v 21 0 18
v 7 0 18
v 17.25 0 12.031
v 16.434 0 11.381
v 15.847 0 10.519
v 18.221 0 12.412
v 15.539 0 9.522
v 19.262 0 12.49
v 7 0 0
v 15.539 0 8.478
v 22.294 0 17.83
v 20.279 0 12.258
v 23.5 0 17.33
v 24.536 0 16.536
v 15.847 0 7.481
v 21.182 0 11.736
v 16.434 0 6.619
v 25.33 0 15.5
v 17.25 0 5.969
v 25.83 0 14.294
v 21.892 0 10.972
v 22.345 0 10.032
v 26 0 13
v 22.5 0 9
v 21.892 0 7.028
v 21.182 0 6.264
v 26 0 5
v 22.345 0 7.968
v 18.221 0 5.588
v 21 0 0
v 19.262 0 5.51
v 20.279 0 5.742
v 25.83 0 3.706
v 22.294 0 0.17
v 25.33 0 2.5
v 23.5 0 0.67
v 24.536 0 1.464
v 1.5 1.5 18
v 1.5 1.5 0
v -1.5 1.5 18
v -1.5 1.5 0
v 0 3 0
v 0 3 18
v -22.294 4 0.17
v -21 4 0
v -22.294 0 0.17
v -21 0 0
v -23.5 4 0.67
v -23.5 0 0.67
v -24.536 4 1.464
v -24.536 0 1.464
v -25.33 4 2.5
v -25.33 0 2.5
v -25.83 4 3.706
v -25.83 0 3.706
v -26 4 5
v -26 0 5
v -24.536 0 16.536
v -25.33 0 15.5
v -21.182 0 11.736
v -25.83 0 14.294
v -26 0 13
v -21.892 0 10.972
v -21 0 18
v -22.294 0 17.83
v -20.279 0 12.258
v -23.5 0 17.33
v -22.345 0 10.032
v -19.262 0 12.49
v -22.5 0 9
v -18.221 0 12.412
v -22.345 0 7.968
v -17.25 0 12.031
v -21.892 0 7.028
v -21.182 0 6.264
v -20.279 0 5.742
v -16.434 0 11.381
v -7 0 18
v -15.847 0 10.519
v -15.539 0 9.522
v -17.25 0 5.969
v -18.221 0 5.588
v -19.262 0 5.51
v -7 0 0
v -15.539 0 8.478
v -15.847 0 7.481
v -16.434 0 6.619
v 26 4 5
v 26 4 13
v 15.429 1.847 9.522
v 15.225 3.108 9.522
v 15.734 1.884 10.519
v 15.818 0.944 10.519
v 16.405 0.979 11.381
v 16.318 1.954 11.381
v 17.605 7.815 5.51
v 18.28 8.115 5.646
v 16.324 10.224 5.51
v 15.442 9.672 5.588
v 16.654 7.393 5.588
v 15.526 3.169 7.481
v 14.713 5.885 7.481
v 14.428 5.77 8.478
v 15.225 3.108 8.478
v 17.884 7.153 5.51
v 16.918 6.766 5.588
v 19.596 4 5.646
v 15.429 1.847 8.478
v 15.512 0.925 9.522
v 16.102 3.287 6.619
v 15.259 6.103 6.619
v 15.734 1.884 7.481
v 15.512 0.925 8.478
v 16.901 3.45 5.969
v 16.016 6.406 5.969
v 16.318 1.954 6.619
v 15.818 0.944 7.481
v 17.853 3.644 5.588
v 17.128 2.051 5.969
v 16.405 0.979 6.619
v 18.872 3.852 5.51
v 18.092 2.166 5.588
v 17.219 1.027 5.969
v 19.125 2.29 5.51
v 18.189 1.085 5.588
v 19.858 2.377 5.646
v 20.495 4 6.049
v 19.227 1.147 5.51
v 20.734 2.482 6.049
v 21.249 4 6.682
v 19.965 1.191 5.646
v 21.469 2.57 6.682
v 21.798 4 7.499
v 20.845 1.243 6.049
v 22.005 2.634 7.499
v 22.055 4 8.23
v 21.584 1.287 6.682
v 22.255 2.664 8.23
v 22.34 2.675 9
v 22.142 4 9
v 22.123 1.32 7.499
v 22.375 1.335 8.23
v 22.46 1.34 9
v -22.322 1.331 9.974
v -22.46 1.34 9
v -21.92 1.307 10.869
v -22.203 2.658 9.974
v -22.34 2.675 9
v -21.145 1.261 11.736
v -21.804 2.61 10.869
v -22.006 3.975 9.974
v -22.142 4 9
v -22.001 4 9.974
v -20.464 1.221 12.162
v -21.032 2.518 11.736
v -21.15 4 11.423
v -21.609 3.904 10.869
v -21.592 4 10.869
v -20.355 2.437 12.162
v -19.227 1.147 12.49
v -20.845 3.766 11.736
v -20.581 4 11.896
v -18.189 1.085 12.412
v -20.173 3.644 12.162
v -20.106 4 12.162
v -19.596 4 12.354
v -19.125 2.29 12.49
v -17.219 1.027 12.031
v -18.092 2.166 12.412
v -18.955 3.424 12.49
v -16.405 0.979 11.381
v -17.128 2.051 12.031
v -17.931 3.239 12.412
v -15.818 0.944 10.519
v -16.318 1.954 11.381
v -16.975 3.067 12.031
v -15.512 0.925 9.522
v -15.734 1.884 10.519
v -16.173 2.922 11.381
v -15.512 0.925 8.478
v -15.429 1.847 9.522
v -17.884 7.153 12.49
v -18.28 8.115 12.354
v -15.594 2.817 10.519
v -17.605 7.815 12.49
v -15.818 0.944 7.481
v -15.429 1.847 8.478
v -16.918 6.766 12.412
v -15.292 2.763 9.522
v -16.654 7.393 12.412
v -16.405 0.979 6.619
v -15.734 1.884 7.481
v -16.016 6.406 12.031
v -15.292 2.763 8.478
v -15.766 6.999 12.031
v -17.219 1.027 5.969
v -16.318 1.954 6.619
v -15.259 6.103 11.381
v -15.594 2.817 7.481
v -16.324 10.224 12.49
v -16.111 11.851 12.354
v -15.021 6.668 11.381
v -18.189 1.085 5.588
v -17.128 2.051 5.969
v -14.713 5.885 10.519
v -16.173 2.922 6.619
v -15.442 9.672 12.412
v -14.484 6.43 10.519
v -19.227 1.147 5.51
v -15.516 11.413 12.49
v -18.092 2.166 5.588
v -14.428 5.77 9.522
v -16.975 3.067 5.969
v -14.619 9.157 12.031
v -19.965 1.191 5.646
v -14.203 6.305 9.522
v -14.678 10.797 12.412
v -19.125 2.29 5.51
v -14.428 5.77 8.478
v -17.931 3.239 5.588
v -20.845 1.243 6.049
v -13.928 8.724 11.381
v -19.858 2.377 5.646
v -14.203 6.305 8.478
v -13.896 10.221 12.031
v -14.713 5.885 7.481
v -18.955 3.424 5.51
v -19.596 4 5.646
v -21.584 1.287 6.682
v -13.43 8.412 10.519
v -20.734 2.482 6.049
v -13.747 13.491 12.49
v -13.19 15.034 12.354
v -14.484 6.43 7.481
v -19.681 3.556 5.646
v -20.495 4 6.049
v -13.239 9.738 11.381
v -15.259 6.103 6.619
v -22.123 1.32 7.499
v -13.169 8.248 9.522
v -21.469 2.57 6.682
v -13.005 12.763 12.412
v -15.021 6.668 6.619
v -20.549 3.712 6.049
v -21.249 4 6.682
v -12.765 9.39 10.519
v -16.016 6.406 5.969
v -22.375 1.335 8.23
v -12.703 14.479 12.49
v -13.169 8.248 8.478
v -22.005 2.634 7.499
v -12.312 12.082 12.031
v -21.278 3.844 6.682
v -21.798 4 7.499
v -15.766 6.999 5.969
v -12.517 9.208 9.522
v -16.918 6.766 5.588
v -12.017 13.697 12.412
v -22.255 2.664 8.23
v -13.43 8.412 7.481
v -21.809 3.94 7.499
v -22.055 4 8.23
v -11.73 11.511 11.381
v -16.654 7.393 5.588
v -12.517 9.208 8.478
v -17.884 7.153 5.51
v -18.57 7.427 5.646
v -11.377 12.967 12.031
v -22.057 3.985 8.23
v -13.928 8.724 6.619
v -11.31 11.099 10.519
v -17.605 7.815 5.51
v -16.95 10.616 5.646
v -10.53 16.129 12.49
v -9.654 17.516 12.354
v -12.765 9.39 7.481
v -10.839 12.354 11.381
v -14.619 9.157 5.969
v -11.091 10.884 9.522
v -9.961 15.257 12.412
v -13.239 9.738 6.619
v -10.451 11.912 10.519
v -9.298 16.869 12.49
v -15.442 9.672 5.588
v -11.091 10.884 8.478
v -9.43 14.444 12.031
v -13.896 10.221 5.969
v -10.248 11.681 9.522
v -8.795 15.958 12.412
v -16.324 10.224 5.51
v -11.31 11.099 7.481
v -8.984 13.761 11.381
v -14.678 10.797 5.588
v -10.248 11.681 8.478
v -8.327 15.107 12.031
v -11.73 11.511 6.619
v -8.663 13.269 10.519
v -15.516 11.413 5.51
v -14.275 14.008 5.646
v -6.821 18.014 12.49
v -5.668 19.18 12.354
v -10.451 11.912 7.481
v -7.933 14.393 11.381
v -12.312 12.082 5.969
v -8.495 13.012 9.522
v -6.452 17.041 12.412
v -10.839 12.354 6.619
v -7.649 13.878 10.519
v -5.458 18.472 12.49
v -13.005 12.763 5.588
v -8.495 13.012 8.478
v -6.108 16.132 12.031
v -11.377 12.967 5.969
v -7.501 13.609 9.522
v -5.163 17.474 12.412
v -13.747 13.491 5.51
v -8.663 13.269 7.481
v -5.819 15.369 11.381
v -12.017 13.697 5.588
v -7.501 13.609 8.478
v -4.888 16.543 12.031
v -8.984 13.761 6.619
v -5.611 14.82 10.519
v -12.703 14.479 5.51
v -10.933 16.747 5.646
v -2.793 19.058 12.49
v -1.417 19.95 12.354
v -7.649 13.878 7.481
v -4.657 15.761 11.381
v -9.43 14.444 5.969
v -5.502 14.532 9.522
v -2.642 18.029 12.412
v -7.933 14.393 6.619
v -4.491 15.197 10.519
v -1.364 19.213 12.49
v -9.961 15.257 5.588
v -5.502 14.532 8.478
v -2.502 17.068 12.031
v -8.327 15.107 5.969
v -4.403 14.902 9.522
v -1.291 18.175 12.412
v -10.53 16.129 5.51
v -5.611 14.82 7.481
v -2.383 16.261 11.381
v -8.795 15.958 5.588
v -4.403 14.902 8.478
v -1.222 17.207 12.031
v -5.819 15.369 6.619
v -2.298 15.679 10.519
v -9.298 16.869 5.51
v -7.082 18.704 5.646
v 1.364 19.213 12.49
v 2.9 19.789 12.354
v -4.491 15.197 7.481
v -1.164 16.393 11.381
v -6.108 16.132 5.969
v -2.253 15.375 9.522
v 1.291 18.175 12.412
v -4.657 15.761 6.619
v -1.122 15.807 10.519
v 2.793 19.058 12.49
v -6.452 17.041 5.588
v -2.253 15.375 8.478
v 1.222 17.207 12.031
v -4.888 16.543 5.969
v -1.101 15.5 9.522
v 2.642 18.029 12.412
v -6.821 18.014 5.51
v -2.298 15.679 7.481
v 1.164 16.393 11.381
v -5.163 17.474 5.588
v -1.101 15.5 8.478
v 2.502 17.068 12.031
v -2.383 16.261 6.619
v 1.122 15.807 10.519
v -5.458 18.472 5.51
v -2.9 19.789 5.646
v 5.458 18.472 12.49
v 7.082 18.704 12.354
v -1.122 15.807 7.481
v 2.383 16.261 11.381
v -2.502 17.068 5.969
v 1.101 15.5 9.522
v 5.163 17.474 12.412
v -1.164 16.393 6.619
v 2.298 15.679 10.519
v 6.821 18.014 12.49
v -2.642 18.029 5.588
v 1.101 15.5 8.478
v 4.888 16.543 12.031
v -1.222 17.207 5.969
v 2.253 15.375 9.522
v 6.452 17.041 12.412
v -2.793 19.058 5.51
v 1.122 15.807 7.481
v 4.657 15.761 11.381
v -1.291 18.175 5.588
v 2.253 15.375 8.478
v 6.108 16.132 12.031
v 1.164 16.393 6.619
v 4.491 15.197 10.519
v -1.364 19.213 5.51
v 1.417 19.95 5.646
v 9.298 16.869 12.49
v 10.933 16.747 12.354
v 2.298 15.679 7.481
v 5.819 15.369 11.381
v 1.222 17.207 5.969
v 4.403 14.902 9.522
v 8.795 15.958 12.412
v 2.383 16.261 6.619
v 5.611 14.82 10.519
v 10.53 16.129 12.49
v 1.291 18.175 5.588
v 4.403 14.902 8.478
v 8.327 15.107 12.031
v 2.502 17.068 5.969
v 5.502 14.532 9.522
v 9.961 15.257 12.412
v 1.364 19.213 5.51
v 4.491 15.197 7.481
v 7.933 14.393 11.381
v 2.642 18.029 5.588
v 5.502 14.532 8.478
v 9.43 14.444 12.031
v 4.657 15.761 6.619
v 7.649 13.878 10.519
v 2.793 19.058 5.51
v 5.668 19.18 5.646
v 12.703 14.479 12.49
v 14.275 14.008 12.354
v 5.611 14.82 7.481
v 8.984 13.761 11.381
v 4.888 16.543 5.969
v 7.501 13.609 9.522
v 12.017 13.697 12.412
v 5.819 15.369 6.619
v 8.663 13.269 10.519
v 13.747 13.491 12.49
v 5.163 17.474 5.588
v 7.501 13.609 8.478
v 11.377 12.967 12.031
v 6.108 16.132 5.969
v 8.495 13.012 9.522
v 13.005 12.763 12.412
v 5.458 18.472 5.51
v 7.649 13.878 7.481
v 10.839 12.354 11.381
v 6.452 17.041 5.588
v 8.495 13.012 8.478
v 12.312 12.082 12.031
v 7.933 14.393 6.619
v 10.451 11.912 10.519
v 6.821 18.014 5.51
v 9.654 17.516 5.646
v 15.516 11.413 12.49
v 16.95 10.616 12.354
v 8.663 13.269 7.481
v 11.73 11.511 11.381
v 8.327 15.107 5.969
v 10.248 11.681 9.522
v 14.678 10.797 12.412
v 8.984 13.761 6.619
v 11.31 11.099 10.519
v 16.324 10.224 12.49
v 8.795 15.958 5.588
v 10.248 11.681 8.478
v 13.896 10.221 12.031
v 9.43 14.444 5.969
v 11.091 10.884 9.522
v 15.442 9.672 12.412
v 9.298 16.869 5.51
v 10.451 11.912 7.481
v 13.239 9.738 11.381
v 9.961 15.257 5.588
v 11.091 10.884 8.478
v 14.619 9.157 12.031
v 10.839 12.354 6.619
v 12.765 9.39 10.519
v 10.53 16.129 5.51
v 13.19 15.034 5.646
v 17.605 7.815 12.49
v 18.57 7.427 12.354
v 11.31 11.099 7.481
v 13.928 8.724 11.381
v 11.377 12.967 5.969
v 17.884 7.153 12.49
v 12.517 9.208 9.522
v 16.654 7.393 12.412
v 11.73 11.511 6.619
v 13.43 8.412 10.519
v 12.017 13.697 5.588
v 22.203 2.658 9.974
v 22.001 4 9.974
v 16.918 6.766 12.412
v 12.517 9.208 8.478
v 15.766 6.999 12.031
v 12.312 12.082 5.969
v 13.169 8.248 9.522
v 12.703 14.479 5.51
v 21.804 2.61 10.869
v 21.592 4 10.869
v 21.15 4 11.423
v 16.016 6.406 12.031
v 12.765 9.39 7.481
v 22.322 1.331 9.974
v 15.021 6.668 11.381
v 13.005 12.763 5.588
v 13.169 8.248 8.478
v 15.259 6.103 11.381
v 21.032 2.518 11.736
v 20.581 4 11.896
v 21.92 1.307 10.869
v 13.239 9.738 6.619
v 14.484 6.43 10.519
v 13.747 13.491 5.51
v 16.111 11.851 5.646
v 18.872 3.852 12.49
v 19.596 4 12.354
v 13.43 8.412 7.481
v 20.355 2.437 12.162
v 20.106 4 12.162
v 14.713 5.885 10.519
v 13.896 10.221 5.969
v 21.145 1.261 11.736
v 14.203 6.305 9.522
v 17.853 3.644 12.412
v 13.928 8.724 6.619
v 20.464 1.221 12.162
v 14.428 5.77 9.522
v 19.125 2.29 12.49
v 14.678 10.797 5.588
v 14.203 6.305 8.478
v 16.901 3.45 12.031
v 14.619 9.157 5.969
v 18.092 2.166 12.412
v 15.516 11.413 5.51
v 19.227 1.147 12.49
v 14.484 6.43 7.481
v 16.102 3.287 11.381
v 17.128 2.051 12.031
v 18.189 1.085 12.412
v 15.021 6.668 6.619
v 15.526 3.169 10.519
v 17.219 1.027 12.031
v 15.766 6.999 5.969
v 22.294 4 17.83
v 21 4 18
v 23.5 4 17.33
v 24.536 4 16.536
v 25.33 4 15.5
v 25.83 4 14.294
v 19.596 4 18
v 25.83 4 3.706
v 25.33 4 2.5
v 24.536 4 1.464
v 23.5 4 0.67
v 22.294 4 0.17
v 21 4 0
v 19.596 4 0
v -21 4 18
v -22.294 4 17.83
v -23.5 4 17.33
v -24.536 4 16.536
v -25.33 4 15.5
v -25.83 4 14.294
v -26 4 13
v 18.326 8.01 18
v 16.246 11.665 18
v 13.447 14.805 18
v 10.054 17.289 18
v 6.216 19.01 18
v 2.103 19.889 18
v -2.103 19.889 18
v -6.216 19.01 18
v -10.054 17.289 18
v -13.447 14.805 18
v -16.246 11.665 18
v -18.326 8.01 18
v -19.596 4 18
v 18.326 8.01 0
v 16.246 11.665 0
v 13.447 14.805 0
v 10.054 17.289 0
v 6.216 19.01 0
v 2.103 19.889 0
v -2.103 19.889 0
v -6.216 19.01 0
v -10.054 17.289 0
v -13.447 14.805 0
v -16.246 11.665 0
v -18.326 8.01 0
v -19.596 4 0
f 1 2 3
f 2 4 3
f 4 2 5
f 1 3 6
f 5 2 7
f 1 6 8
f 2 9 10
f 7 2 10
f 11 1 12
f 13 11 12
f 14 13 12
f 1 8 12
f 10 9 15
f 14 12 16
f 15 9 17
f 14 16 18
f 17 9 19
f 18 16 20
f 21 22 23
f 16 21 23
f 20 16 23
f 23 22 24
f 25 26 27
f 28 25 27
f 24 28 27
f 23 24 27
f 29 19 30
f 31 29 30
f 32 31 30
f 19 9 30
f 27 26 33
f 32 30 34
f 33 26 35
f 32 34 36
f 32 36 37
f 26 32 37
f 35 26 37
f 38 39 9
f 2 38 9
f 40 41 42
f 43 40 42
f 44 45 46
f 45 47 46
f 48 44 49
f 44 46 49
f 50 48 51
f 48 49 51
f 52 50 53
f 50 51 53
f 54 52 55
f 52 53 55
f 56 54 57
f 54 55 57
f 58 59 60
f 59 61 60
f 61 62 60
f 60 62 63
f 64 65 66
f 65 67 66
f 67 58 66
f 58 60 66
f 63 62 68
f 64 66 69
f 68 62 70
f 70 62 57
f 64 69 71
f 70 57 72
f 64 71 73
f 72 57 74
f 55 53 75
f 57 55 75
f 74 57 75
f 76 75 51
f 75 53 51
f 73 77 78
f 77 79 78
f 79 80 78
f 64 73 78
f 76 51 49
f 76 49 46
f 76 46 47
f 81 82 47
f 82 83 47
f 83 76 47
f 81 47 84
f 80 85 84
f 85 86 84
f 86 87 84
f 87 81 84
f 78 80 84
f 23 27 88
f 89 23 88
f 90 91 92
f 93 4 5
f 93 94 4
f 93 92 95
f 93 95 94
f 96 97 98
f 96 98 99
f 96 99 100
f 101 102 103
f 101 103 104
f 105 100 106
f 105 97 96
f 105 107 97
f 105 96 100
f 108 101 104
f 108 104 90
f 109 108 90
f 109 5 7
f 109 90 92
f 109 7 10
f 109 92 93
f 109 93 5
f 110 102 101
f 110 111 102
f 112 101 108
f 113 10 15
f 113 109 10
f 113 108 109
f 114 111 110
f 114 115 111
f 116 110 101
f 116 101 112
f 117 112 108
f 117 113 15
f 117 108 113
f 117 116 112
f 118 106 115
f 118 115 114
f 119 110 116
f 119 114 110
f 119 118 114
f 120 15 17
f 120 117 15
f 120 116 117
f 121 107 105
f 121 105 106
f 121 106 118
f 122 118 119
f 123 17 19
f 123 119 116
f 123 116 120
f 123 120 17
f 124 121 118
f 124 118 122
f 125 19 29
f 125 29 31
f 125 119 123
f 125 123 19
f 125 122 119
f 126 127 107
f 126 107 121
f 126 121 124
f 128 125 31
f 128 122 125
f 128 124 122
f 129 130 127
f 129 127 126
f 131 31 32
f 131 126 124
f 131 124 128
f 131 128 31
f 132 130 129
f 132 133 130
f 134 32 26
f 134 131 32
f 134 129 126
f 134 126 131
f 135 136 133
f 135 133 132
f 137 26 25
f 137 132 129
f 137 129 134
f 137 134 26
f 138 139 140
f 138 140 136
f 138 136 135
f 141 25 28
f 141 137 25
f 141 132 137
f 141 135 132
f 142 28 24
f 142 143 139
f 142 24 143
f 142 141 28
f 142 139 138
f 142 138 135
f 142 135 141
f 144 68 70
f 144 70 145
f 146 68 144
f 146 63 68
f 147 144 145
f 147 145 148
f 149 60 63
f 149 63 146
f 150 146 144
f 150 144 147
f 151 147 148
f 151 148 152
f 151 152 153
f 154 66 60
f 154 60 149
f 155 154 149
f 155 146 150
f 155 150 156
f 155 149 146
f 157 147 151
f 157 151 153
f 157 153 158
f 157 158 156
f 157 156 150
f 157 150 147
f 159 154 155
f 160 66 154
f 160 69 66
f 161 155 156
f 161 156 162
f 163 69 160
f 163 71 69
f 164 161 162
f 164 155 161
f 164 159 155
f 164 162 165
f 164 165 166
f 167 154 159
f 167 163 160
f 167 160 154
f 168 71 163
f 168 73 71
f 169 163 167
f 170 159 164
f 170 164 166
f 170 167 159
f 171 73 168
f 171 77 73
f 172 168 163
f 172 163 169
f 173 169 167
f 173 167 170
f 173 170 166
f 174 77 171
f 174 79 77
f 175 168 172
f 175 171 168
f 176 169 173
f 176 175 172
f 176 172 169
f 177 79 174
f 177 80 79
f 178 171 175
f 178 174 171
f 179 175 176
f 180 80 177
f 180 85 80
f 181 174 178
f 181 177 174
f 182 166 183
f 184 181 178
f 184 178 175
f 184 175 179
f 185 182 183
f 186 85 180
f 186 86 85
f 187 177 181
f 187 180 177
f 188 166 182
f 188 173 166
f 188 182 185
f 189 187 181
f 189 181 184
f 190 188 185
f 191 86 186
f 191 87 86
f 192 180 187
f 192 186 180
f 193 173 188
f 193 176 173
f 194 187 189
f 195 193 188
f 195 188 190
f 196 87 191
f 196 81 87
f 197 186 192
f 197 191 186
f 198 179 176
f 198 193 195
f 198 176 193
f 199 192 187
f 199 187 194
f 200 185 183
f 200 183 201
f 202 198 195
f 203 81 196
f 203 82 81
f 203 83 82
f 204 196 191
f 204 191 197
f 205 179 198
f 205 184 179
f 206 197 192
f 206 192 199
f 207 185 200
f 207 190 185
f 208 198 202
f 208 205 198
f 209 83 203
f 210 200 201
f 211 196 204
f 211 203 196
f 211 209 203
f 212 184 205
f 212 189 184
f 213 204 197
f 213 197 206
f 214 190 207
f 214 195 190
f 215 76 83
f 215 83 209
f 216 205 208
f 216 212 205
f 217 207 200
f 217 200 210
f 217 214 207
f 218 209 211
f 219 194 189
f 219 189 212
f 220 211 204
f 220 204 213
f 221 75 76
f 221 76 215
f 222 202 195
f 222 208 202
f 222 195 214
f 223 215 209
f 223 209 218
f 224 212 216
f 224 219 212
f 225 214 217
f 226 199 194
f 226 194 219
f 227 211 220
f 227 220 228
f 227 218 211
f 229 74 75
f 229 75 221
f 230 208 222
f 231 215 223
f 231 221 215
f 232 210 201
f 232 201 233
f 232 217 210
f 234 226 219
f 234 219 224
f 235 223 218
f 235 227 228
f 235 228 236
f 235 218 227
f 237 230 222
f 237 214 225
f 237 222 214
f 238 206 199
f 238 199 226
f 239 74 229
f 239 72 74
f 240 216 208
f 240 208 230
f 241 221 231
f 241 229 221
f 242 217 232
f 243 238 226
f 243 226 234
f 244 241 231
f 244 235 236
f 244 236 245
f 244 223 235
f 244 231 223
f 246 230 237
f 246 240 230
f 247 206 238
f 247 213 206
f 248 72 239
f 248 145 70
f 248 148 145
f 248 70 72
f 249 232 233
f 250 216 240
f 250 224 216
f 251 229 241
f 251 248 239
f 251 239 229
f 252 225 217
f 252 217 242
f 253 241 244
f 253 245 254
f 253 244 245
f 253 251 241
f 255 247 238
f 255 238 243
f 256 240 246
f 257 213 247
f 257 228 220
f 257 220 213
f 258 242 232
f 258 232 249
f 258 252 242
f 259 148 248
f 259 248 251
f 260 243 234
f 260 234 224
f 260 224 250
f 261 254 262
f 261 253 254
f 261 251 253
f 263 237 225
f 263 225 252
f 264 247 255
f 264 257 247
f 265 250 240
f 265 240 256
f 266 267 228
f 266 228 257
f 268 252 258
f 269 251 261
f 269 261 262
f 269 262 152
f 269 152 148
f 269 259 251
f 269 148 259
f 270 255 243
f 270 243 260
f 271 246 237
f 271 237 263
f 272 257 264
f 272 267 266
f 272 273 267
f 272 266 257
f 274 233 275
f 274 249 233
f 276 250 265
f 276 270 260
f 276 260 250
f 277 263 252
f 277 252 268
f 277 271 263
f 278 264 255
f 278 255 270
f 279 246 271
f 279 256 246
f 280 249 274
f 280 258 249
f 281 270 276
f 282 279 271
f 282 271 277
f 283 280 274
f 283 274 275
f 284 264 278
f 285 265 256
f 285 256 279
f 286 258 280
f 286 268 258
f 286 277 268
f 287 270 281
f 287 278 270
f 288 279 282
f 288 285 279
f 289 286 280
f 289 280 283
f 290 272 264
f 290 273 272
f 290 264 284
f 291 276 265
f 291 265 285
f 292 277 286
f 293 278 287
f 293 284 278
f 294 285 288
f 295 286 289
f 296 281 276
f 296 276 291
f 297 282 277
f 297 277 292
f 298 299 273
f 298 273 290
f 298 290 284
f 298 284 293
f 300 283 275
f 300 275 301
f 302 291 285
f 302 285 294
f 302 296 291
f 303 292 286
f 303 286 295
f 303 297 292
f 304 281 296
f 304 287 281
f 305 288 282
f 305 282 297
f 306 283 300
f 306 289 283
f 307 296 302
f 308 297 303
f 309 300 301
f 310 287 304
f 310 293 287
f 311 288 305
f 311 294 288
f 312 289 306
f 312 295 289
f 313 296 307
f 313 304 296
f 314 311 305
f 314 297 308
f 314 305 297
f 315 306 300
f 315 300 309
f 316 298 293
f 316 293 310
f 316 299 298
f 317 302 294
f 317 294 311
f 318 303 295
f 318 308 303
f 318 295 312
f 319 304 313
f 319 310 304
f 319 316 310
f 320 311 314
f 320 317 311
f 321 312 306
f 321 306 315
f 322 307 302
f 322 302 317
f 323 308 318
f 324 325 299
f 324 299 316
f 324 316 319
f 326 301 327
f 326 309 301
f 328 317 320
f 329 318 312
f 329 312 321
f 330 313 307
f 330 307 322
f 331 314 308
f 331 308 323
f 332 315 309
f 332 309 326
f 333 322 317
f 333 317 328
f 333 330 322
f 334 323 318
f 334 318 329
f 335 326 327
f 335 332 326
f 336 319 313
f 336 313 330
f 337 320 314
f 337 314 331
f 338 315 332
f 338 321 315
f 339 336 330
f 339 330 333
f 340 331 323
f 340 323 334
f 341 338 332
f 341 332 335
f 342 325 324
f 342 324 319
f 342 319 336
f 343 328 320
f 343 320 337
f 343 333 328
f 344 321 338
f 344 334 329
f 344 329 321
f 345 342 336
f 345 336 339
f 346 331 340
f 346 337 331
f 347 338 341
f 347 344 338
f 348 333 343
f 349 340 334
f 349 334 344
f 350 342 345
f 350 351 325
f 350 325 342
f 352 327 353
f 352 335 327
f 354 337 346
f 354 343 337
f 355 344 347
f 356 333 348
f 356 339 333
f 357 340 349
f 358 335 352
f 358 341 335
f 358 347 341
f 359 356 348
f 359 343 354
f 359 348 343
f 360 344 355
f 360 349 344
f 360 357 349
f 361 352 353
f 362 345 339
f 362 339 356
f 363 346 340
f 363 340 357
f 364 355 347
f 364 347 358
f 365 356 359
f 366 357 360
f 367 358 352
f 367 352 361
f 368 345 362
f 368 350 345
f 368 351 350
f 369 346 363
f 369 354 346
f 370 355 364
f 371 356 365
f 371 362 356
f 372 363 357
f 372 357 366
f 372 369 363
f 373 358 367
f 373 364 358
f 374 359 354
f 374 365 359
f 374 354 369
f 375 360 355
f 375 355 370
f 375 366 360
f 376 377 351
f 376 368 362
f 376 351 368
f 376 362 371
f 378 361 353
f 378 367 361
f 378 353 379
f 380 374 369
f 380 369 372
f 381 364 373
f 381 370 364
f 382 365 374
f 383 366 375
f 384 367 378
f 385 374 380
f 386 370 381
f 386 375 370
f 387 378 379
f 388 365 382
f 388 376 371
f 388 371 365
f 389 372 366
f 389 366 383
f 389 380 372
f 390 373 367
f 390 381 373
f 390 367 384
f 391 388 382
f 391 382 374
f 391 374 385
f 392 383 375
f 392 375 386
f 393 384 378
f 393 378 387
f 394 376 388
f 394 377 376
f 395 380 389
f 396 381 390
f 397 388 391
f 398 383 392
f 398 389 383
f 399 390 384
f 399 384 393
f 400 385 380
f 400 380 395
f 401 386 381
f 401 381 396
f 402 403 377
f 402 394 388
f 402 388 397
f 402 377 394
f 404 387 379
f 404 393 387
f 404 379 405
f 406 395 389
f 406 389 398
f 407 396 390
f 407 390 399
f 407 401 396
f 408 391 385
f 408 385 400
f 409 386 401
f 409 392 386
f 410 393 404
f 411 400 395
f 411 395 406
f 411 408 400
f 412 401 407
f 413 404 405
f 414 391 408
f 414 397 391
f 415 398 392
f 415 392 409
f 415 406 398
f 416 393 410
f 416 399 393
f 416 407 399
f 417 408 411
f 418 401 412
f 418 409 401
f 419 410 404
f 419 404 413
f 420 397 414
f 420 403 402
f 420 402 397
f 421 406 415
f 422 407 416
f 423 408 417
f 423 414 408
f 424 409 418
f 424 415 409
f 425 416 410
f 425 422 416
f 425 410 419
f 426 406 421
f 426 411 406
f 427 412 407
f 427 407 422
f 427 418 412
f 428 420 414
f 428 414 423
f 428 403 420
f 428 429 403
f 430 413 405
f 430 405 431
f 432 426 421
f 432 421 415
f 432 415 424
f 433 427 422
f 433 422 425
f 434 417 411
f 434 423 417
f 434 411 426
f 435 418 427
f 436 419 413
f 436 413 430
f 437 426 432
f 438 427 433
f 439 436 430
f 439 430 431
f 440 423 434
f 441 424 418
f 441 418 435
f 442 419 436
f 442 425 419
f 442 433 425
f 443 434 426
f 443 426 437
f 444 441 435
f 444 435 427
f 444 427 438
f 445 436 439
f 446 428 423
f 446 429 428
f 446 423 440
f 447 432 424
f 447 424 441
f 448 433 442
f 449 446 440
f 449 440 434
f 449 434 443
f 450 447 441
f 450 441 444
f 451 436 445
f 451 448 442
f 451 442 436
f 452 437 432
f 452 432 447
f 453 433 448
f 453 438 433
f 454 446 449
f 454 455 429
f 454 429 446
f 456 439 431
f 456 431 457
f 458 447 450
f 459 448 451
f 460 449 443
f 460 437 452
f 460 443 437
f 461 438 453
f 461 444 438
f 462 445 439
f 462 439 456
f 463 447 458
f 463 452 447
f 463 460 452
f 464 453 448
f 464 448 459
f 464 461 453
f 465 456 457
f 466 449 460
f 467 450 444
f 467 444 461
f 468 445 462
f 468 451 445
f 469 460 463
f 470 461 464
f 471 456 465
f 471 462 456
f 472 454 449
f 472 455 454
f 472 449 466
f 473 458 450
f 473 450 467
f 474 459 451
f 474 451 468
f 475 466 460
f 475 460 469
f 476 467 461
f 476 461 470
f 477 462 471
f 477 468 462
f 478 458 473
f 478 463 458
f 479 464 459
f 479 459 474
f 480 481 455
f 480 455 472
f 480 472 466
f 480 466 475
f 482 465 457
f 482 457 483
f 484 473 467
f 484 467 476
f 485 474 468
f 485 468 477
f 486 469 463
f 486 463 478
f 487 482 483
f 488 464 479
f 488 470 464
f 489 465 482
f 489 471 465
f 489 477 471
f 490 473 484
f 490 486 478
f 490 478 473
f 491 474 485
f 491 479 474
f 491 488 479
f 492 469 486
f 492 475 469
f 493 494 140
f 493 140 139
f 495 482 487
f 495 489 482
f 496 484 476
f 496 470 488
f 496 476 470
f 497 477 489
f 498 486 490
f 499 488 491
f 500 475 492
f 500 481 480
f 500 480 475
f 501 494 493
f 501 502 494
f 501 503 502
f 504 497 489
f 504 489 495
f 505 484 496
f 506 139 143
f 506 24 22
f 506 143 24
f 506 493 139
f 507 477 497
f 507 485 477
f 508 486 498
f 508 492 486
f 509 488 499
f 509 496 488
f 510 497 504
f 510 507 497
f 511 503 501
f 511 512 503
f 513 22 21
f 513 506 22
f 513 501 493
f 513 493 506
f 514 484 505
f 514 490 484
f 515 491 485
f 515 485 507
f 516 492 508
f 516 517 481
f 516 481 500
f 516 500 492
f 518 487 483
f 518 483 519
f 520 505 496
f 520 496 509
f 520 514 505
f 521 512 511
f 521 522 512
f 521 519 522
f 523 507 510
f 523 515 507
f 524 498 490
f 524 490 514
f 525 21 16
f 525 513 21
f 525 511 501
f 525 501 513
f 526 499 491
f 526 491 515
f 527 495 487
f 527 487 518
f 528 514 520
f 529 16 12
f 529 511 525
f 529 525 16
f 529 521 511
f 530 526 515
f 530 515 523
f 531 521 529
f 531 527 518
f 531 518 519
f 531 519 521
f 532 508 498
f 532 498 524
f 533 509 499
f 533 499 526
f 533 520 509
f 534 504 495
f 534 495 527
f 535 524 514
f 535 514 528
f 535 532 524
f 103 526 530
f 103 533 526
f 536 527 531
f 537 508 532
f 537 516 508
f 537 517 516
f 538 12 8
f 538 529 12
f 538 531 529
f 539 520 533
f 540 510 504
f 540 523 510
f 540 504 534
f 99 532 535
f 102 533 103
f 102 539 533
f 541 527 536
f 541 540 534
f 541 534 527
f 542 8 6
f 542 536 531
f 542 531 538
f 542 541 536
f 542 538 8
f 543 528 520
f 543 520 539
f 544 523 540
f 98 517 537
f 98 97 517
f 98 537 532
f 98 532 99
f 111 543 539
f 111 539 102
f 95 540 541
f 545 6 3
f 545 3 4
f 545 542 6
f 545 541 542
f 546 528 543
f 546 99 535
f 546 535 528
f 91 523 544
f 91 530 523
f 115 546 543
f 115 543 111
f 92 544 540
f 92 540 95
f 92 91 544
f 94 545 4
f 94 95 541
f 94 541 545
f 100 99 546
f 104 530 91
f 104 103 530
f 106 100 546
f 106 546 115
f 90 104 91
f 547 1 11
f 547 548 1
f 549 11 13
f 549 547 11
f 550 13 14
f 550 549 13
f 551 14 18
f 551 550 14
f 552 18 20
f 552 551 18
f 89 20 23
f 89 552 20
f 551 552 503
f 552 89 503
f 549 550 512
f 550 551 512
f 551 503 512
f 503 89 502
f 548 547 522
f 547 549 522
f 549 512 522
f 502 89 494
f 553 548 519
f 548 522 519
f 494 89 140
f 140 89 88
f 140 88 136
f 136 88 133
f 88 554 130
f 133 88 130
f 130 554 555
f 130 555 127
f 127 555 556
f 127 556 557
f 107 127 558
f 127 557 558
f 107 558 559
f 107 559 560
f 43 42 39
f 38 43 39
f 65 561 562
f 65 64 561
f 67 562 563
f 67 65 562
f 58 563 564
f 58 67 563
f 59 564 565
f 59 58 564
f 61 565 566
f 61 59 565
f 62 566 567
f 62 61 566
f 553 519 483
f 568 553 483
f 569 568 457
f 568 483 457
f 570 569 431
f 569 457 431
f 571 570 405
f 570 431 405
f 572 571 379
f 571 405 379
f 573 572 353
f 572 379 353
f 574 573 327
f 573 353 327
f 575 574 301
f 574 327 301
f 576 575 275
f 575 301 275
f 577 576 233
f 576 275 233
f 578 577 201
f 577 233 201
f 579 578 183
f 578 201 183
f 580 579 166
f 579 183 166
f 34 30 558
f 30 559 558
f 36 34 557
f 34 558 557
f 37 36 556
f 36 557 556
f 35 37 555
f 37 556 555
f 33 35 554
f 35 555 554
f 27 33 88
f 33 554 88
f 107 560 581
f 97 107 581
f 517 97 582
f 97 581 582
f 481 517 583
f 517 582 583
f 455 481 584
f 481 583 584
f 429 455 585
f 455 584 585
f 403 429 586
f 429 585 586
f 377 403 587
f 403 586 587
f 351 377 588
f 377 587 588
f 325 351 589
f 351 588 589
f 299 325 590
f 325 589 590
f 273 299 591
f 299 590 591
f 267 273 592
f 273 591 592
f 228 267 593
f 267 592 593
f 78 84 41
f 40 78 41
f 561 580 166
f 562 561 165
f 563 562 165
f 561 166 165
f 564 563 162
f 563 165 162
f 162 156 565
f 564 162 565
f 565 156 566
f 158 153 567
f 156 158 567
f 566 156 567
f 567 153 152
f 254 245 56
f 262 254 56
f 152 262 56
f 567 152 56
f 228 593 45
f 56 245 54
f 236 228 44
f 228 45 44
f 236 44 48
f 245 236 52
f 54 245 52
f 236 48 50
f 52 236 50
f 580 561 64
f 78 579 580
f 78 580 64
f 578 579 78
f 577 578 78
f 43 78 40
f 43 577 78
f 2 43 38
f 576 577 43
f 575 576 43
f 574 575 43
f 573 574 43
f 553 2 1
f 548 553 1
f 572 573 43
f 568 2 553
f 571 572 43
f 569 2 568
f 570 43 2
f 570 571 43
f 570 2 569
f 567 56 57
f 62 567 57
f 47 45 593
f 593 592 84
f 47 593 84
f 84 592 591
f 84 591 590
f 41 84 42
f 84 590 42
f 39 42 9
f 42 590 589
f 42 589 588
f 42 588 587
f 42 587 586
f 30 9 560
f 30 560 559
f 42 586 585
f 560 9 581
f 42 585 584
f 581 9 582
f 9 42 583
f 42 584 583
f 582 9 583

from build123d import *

# Parameters (mm, degrees)
F1_DEPTH = 18
F2_R     = 3.5
F4_R     = 5


with BuildPart() as f1:
    # F0 (on Top) → F1 (new body)
    with BuildSketch(Plane.XY):
        with BuildLine():
            Line((26, 4), (19.595918, 4))
            ThreePointArc((19.595918, 4), (0, 20), (-19.595918, 4))
            Line((-19.595918, 4), (-26, 4))
            Line((-26, 4), (-26, 0))
            Line((-26, 0), (-7, 0))
            Line((-7, 0), (-1.5, 1.5))
            Line((-1.5, 1.5), (0, 3))
            Line((0, 3), (1.5, 1.5))
            Line((1.5, 1.5), (7, 0))
            Line((7, 0), (26, 0))
            Line((26, 0), (26, 4))
        make_face()
    extrude(amount=F1_DEPTH)

    # F2 (on face) → F3 (revolve, cut)
    with BuildSketch(Plane.XZ):
        with Locations((19, 9)):
            Circle(F2_R)
    revolve(axis=Axis((0, 0, 6.141683), (0, 0, -1)), mode=Mode.SUBTRACT)

    # F4
    f4_edges = [f1.edges().sort_by_distance(p)[0] for p in [
        (26, 2, 18),
        (26, 2, 0),
        (-26, 2, 0),
        (-26, 2, 18),
    ]]
    fillet(f4_edges, radius=F4_R)


solid = f1.part
